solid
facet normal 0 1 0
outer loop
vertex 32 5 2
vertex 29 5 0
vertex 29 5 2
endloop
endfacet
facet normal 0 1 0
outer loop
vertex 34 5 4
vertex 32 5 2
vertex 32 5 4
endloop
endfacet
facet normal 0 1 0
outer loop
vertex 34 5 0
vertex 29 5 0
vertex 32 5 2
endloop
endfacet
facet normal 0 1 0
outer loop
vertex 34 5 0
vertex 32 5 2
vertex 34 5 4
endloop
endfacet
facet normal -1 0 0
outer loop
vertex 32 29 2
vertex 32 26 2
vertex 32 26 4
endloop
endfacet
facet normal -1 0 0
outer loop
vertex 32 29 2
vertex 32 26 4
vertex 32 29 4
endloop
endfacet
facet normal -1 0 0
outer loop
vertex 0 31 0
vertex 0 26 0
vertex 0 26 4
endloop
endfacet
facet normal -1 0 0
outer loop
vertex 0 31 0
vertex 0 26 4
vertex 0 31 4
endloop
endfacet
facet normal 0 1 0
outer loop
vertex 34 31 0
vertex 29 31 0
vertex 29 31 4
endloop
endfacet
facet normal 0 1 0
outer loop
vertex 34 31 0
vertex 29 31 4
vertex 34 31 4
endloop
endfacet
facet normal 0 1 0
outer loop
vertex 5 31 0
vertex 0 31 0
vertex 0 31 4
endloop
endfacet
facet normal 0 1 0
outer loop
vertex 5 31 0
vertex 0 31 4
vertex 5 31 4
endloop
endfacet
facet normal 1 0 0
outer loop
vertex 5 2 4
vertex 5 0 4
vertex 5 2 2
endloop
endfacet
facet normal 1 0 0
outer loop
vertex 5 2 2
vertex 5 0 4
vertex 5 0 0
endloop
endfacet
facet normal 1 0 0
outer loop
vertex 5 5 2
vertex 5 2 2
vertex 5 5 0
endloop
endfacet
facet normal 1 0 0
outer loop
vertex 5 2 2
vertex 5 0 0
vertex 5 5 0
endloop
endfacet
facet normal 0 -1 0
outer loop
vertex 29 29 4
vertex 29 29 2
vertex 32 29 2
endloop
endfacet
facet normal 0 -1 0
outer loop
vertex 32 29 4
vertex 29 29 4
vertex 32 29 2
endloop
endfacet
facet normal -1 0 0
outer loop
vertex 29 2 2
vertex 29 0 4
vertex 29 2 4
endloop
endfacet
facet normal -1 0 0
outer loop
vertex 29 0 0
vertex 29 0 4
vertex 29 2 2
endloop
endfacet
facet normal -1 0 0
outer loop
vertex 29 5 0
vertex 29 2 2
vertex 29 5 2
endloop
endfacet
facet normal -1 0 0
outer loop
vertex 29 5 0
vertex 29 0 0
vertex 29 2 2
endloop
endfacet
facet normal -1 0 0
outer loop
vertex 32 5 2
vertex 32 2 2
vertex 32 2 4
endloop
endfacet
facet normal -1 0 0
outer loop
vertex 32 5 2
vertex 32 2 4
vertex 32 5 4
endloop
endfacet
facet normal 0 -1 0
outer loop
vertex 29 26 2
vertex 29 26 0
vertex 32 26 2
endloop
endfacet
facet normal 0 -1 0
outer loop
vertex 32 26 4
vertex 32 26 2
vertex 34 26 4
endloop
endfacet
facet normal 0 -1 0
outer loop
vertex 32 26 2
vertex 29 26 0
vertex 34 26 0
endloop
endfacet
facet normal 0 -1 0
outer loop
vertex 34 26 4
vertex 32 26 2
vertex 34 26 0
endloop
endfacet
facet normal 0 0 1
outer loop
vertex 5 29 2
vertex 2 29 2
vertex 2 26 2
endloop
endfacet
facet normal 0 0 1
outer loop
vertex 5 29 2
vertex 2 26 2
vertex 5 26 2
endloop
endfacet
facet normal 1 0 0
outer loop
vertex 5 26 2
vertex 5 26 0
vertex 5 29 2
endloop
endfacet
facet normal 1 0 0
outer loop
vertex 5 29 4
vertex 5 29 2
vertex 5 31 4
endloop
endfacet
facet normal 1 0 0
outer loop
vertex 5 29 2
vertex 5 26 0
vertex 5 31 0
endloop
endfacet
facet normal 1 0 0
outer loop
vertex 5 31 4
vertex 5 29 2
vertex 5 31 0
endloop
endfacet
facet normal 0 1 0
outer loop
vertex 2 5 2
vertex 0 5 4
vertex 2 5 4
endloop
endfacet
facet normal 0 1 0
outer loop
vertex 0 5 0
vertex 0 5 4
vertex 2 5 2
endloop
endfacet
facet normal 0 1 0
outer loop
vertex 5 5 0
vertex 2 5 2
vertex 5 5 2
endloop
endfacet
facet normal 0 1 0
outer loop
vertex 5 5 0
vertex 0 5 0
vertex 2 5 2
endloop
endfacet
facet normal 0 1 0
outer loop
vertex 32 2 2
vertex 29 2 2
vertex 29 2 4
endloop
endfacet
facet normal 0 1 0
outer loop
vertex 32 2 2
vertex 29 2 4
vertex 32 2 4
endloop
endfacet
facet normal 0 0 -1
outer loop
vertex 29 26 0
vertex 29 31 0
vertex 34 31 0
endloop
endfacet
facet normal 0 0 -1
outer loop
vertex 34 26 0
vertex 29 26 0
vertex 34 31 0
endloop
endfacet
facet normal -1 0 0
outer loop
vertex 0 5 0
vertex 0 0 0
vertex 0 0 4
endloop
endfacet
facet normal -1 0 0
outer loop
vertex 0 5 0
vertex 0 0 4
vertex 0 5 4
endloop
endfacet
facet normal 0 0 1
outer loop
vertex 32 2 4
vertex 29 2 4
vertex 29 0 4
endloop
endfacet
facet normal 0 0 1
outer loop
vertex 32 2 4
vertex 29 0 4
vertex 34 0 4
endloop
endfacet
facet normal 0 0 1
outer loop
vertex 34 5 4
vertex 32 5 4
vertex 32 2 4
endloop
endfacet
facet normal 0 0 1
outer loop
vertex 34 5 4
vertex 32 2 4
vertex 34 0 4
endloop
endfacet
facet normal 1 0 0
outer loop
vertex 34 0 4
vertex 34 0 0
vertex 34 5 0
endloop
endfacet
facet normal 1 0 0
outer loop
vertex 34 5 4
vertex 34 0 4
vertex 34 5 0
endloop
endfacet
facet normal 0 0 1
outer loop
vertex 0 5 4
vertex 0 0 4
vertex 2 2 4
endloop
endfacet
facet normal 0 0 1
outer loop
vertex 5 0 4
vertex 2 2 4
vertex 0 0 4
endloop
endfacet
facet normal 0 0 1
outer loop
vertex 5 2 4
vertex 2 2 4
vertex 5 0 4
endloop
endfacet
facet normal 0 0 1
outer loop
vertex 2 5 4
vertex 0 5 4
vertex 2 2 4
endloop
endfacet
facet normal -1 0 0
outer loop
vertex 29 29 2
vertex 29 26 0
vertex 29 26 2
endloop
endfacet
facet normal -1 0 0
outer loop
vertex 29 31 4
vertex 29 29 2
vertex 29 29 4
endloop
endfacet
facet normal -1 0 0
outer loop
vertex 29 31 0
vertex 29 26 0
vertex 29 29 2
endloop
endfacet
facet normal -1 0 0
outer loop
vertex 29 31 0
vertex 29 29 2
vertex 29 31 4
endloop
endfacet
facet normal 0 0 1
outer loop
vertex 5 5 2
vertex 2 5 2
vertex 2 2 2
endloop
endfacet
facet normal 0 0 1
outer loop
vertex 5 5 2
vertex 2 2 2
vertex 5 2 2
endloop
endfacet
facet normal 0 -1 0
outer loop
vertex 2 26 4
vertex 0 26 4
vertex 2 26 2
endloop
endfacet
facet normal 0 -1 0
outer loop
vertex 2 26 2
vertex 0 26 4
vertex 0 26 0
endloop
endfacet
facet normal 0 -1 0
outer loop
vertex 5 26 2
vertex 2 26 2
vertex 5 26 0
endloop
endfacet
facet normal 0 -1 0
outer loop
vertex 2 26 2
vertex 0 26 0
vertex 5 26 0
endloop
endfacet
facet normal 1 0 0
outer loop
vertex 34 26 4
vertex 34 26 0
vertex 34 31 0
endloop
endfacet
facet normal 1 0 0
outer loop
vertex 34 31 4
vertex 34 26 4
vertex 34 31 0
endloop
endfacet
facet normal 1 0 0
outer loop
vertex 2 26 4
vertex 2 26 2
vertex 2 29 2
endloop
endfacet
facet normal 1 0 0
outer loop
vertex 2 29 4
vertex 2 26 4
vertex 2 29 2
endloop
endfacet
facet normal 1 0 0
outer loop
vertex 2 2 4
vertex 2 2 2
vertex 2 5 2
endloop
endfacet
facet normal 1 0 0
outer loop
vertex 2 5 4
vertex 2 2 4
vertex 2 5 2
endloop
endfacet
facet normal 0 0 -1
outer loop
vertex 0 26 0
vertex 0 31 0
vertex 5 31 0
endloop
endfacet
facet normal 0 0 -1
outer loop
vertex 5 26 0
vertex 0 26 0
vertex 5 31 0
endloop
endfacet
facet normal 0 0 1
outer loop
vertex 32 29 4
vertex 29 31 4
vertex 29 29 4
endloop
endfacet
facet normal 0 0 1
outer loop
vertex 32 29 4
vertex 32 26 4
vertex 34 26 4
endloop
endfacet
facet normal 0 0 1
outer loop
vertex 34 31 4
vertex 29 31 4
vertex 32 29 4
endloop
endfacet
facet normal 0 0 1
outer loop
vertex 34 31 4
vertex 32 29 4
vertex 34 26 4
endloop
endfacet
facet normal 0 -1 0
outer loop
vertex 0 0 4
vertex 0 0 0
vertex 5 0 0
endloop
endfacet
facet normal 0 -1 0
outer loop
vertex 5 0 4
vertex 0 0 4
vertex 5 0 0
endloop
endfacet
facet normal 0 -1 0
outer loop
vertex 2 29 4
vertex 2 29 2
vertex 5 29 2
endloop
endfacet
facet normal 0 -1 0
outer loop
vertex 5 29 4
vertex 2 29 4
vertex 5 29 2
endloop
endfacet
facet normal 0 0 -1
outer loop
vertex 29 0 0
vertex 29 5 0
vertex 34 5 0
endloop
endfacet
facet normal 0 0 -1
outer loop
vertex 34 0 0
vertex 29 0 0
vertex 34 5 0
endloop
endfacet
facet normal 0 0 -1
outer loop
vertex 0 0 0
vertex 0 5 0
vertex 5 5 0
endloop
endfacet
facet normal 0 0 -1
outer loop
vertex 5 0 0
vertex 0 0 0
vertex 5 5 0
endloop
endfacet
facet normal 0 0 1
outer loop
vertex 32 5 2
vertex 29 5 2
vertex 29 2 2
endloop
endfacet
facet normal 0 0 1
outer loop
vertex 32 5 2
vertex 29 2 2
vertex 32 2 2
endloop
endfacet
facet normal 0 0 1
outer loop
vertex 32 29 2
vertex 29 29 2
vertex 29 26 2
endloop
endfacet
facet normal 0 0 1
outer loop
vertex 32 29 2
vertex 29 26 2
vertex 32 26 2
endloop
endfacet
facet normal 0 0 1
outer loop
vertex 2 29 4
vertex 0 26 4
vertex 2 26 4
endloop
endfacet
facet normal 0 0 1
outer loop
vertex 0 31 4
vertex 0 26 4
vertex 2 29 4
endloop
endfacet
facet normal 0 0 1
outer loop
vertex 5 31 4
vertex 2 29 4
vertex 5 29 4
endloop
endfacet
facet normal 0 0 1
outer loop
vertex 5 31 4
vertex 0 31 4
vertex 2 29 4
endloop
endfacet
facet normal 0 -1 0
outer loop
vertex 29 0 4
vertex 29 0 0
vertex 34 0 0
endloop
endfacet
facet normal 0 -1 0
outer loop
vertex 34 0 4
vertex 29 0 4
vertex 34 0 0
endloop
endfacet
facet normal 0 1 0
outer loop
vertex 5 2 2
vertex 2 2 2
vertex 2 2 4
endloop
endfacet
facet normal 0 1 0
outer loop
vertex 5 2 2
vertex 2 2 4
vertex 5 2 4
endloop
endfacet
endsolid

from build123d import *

# Parameters (mm, degrees)
BOX003_W     = 24
BOX003_H     = 31
BOX003_DEPTH = 10
BOX002_W     = 34
BOX002_H     = 21
BOX002_DEPTH = 10
BOX_W        = 30
BOX_H        = 27
BOX_DEPTH    = 3
BOX001_W     = 34
BOX001_H     = 31
BOX001_DEPTH = 4


with BuildPart() as cube002:
    # Box003 → Box003 (new body)
    with BuildSketch(Plane(origin=(5, 0, 0), x_dir=(1, 0, 0), z_dir=(0, 0, 1))):
        with Locations((12, 15.5)):
            Rectangle(BOX003_W, BOX003_H)
    extrude(amount=BOX003_DEPTH)


with BuildPart() as cube001:
    # Box002 → Box002 (new body)
    with BuildSketch(Plane(origin=(0, 5, 0), x_dir=(1, 0, 0), z_dir=(0, 0, 1))):
        with Locations((17, 10.5)):
            Rectangle(BOX002_W, BOX002_H)
    extrude(amount=BOX002_DEPTH)


with BuildPart() as expansionmodule:
    # Box → Box (new body)
    with BuildSketch(Plane(origin=(2, 2, 2), x_dir=(1, 0, 0), z_dir=(0, 0, 1))):
        with Locations((15, 13.5)):
            Rectangle(BOX_W, BOX_H)
    extrude(amount=BOX_DEPTH)


with BuildPart() as cut002:
    # Box001 → Box001 (new body)
    with BuildSketch(Plane.XY):
        with Locations((17, 15.5)):
            Rectangle(BOX001_W, BOX001_H)
    extrude(amount=BOX001_DEPTH)

    # Cut: cut Expansionmodule
    add(expansionmodule.part, mode=Mode.SUBTRACT)

    # Cut001: cut Cube001
    add(cube001.part, mode=Mode.SUBTRACT)

    # Cut002: cut Cube002
    add(cube002.part, mode=Mode.SUBTRACT)


solid = cut002.part
